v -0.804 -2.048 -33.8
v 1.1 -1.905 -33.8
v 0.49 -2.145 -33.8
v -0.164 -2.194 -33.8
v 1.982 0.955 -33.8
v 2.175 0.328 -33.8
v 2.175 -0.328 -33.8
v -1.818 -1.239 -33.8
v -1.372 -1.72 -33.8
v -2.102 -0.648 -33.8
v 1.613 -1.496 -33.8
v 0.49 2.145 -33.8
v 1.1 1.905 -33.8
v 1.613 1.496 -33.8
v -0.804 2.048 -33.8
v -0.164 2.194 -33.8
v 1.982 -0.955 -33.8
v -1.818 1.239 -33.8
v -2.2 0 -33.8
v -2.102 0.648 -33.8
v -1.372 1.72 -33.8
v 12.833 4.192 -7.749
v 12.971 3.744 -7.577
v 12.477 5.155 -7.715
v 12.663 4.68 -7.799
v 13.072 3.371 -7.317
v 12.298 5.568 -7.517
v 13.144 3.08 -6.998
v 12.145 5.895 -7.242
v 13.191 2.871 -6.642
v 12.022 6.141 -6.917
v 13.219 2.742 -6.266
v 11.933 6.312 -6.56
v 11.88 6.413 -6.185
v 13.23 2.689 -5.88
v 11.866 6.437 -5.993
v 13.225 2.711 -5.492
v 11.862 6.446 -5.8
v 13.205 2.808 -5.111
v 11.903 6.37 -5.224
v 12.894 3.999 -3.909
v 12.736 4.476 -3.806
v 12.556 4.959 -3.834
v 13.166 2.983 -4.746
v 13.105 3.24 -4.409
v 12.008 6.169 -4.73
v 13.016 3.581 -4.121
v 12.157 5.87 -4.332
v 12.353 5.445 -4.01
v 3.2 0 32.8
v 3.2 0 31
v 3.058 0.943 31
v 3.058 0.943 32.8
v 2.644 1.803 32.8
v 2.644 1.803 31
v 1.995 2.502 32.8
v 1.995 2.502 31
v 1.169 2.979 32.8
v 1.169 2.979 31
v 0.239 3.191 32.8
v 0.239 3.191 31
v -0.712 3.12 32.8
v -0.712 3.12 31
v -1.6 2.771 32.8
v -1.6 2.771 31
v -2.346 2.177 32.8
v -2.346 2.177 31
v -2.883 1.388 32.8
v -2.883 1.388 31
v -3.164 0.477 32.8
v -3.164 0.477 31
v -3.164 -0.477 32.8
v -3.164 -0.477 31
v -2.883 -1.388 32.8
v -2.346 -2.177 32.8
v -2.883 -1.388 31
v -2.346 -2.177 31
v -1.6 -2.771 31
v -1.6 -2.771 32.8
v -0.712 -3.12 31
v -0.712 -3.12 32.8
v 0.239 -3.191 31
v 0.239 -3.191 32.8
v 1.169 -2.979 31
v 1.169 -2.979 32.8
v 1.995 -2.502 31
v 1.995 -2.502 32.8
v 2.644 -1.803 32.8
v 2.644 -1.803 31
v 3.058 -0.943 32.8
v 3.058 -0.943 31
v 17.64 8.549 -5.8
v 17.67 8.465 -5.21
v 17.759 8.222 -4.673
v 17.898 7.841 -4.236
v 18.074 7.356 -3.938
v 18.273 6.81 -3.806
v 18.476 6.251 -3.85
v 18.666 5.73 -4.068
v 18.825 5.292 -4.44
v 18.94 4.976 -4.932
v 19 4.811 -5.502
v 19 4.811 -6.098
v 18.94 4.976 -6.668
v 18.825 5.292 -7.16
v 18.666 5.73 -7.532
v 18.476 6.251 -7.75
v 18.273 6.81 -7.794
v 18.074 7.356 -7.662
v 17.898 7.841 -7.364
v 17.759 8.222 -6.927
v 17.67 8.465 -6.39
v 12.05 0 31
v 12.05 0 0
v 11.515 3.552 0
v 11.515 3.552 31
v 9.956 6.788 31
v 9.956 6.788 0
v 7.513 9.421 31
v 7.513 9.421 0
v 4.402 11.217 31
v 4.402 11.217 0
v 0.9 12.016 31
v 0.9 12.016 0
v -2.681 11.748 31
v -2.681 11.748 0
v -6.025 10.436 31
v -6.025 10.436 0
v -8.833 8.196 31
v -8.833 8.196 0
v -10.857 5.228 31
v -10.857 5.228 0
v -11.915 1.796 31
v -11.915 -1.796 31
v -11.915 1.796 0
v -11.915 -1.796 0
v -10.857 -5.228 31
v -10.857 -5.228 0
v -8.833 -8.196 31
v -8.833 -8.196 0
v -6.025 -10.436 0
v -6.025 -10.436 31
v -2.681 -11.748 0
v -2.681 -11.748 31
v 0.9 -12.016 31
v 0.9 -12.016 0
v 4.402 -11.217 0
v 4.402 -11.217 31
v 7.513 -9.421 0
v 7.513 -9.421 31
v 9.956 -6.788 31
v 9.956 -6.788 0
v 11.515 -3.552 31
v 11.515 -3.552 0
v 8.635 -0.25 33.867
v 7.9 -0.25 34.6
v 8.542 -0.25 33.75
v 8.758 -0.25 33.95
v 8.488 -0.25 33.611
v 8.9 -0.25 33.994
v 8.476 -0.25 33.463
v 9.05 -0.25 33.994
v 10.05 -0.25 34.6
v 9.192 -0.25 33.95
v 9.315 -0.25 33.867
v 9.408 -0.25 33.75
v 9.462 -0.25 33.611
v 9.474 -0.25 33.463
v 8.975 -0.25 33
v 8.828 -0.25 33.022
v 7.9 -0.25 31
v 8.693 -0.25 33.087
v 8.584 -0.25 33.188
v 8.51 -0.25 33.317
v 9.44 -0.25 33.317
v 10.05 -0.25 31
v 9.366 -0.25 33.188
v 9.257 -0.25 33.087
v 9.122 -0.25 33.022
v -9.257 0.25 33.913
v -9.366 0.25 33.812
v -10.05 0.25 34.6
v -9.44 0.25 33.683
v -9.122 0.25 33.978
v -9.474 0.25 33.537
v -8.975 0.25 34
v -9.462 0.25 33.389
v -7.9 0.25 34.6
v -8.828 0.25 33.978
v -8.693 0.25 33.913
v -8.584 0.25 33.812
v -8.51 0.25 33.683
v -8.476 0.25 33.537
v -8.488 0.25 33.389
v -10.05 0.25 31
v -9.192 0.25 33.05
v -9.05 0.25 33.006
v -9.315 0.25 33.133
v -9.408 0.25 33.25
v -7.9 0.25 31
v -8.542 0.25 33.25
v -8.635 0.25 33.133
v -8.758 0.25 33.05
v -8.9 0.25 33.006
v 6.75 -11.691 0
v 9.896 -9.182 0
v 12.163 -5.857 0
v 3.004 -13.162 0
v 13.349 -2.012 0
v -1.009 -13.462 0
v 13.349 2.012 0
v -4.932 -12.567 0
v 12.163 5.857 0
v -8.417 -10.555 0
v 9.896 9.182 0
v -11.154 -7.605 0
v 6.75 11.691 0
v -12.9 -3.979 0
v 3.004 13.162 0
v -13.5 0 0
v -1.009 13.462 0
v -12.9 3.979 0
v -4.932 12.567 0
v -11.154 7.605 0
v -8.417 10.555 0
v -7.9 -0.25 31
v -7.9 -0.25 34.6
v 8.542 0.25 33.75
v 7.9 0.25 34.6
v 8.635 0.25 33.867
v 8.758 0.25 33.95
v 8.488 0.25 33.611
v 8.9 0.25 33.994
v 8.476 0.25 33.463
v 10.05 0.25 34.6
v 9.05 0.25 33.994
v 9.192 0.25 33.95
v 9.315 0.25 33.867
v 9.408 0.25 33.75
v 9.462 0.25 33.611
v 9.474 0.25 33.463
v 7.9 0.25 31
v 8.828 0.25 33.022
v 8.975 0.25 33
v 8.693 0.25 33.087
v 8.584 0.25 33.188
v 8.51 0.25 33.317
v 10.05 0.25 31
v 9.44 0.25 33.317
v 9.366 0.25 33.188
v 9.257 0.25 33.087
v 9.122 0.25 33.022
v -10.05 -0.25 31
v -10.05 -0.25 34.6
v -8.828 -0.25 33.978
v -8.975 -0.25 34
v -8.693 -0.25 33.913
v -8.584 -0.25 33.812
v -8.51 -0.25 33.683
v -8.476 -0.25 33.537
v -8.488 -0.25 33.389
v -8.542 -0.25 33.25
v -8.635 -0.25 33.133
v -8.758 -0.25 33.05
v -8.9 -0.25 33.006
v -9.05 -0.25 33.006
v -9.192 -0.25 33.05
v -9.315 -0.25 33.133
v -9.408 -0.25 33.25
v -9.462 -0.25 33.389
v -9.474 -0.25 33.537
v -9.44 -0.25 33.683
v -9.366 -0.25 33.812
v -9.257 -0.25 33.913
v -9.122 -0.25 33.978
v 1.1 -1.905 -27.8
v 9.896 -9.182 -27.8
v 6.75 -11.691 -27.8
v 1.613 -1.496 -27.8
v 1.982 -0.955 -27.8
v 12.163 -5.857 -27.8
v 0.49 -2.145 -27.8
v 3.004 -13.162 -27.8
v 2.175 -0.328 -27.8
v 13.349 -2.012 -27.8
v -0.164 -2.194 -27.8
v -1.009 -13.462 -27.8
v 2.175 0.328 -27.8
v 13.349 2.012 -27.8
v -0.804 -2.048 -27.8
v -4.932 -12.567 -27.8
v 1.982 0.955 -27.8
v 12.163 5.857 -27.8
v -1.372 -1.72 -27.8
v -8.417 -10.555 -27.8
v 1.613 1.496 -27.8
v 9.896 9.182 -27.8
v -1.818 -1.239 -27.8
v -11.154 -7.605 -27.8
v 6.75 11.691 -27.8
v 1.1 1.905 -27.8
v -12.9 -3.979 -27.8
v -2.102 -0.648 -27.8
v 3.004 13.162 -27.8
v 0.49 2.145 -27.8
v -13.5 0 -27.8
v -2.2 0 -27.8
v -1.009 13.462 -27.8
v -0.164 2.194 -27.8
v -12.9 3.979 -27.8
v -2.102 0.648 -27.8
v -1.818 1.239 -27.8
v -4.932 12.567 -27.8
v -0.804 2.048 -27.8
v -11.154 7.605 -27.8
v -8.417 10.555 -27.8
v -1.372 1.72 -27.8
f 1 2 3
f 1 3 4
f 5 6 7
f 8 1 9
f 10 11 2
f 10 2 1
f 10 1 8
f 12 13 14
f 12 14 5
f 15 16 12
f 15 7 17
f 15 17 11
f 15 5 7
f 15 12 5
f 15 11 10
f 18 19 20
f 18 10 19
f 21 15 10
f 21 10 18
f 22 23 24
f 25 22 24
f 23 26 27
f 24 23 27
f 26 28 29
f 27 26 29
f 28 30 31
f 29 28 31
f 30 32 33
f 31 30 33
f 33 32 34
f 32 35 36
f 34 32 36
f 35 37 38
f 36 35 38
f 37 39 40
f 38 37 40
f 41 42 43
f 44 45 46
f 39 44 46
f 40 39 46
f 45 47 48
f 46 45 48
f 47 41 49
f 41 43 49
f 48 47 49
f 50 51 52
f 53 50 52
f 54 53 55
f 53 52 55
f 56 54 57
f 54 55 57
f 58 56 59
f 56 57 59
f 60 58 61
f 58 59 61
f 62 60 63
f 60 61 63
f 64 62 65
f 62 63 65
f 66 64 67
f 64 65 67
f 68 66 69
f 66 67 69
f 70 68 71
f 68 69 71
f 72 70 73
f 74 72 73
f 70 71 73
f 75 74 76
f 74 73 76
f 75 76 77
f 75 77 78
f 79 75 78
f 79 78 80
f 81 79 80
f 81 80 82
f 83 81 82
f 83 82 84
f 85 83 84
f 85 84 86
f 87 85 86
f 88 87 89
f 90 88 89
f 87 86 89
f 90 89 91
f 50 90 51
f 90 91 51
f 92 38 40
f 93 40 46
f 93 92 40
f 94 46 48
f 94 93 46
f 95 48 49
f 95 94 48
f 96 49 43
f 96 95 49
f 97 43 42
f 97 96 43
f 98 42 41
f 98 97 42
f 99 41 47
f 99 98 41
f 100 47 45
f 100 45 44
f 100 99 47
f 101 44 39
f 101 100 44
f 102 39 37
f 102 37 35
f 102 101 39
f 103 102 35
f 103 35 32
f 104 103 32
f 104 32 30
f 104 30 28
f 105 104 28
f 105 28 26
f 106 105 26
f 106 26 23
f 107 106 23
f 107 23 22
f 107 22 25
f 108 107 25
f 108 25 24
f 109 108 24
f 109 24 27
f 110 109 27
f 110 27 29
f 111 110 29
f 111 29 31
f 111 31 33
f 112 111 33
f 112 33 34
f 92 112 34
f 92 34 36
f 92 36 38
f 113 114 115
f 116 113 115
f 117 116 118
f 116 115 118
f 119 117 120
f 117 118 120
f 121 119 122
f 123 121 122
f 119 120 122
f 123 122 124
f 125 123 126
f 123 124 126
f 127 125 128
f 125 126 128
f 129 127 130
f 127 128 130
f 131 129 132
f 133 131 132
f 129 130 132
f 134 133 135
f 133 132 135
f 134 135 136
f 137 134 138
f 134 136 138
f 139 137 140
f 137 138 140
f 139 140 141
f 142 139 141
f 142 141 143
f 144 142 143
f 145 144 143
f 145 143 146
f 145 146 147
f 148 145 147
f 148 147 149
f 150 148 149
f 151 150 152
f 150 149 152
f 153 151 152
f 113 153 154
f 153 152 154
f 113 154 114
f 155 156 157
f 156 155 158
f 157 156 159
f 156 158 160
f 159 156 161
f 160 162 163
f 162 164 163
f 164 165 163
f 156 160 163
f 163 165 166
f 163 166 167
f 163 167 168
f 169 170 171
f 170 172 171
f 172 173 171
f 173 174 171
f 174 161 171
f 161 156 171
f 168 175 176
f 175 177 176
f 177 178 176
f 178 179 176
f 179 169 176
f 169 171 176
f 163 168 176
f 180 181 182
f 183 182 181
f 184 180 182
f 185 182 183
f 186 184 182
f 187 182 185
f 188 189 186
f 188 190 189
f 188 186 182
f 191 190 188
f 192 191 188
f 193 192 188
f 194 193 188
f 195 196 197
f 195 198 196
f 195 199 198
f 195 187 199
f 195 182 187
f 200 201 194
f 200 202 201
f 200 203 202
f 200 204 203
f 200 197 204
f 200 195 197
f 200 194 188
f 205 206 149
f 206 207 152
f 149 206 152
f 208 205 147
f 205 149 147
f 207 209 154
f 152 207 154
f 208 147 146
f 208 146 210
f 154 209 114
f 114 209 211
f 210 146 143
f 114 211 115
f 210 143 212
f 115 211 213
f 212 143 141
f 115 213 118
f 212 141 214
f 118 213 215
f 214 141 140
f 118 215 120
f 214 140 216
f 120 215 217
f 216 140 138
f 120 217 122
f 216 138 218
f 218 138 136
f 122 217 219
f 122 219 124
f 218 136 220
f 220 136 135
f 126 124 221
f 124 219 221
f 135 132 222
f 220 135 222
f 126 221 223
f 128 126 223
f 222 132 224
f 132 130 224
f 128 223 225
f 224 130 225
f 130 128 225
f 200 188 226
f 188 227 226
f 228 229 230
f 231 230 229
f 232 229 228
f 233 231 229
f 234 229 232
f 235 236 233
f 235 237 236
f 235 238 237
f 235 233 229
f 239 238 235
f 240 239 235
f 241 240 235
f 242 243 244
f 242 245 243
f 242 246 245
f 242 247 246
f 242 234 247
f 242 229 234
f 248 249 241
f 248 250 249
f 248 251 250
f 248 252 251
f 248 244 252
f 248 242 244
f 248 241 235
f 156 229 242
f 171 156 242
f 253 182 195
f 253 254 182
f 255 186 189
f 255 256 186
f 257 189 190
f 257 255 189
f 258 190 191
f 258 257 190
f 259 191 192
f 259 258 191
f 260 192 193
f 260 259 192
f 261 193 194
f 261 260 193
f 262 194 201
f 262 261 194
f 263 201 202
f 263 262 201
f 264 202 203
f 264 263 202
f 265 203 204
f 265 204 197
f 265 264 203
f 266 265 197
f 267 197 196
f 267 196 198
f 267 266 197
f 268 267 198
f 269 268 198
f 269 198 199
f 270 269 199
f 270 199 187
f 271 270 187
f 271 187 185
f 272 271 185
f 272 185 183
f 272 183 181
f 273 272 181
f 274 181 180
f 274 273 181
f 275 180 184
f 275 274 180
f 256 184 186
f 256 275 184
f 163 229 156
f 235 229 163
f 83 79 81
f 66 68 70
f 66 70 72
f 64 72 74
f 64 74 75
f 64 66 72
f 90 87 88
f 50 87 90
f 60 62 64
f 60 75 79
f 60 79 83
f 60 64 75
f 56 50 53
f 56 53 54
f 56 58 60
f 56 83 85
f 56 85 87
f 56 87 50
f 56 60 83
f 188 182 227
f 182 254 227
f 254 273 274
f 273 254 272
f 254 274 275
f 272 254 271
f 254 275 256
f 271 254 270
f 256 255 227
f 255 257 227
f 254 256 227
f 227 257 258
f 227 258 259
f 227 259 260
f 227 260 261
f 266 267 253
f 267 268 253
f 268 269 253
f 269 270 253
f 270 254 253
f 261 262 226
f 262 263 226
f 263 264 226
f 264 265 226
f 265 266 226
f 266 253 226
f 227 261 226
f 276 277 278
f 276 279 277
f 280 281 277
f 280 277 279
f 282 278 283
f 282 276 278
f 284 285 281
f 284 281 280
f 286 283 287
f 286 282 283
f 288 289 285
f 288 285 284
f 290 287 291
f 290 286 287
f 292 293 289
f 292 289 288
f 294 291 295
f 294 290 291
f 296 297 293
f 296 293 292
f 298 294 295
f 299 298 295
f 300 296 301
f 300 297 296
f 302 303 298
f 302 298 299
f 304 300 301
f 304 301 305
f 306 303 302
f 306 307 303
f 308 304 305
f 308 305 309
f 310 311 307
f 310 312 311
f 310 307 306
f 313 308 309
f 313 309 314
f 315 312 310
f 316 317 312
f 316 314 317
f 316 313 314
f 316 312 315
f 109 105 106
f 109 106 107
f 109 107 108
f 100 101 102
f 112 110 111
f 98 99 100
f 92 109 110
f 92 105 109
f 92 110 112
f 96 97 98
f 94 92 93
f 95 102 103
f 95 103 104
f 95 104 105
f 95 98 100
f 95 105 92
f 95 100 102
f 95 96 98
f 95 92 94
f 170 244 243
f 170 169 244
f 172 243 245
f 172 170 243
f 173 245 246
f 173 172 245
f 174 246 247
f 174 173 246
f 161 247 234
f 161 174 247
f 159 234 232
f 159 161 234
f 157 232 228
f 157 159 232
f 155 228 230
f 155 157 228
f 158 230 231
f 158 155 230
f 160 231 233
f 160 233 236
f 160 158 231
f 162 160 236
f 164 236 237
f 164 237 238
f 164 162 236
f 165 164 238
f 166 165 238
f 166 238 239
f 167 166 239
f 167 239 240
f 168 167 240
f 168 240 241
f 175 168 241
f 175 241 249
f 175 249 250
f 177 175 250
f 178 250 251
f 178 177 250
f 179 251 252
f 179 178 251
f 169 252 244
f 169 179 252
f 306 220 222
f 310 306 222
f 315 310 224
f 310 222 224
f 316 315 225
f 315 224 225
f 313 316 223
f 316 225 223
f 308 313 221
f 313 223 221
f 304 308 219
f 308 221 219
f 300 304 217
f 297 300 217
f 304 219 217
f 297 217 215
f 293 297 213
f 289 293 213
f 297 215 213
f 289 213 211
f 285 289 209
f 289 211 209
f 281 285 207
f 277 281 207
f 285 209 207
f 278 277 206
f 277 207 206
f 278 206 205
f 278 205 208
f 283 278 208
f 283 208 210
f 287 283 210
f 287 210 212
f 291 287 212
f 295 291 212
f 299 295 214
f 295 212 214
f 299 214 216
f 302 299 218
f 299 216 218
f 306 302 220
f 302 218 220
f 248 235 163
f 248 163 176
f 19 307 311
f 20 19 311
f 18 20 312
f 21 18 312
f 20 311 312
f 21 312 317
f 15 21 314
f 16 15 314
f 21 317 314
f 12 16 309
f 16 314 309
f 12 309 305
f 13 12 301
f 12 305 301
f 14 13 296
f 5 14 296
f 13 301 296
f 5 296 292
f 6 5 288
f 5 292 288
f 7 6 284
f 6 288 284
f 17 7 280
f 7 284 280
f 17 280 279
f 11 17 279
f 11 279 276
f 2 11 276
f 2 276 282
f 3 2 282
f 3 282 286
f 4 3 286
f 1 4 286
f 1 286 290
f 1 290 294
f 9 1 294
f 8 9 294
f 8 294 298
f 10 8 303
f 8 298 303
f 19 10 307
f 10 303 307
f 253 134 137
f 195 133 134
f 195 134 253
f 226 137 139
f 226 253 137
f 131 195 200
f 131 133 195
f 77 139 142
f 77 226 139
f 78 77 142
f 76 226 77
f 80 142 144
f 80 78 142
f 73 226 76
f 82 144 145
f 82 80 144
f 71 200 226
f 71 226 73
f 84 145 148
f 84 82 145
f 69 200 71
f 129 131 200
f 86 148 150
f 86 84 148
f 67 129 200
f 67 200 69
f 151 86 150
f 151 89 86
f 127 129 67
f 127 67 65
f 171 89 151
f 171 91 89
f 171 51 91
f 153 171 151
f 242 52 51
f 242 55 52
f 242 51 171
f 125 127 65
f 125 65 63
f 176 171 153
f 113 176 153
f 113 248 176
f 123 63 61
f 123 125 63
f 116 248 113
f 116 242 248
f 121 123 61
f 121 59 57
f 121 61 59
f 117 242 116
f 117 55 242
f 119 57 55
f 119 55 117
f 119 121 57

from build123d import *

# Parameters (mm, degrees)
ESQUISSE1_R             = 12.05
BOSS_EXTRU_1_DEPTH      = 31
ESQUISSE3_R             = 13.5
BOSS_EXTRU_2_DEPTH      = 27.8
ESQUISSE8_R             = 3.2
BOSS_EXTRU_6_DEPTH      = 1.8
ESQUISSE4_R             = 2.2
BOSS_EXTRU_3_DEPTH      = 6
BOSS_EXTRU_4_REACH      = 54.437
BOSS_EXTRU_4_END_RADIUS = 13.5
BOSS_EXTRU_4_START      = 6
ESQUISSE5_R             = 2
ESQUISSE7_W             = 2.15
ESQUISSE7_H             = 3.6
ESQUISSE7_R             = 0.5
BOSS_EXTRU_5_DEPTH      = 0.25


with BuildPart() as part:
    # Esquisse1 → Boss.-Extru.1 (new body)
    with BuildSketch(Plane.XY):
        Circle(ESQUISSE1_R)
    extrude(amount=BOSS_EXTRU_1_DEPTH)

    # Esquisse3 → Boss.-Extru.2 (add)
    with BuildSketch(Plane(origin=(0, 0, 0), x_dir=(-1, 0, 0), z_dir=(0, 0, -1))):
        Circle(ESQUISSE3_R)
    extrude(amount=BOSS_EXTRU_2_DEPTH)

    # Esquisse8 → Boss.-Extru.6 (add)
    with BuildSketch(Plane.XY.offset(31)):
        Circle(ESQUISSE8_R)
    extrude(amount=BOSS_EXTRU_6_DEPTH)

    # Esquisse4 → Boss.-Extru.3 (add)
    with BuildSketch(Plane(origin=(0, 0, -27.8), x_dir=(-1, 0, 0), z_dir=(0, 0, -1))):
        Circle(ESQUISSE4_R)
    extrude(amount=BOSS_EXTRU_3_DEPTH)

    # Esquisse7 → Boss.-Extru.5 (add, symmetric)
    # profile 1 of 2: a face of its own
    with BuildSketch(Plane(origin=(0, 0, 0), x_dir=(1, 0, 0), z_dir=(0, 1, 0))):
        with Locations((-8.975, -32.8)):
            Rectangle(ESQUISSE7_W, ESQUISSE7_H)
        with Locations(Location((-8.975, -33.5, 0), (0, 0, 270))):
            Circle(ESQUISSE7_R, mode=Mode.SUBTRACT)
    # profile 2 of 2: a face of its own
    with BuildSketch(Plane(origin=(0, 0, 0), x_dir=(1, 0, 0), z_dir=(0, 1, 0))):
        with Locations((8.975, -32.8)):
            Rectangle(ESQUISSE7_W, ESQUISSE7_H)
        with Locations(Location((8.975, -33.5, 0), (0, 0, 90))):
            Circle(ESQUISSE7_R, mode=Mode.SUBTRACT)
    extrude(amount=BOSS_EXTRU_5_DEPTH, both=True)


with BuildPart() as body_2:
    # Boss.-Extru.4: up to this cylinder (the profile starts outside it)
    boss_extru_4_end = Plane(origin=(0, 0, -5.8), z_dir=(0, 0, 1)) * Cylinder(BOSS_EXTRU_4_END_RADIUS, 136.874, mode=Mode.PRIVATE)
    # Esquisse5 → Boss.-Extru.4 (new, up to the surface)
    with BuildSketch(Plane(origin=(12.685850381, 4.617271935, 0), x_dir=(0, 0, 1), z_dir=(0.9396926207859081, 0.34202014332566943, 0)).offset(BOSS_EXTRU_4_START), mode=Mode.PRIVATE) as boss_extru_4_sk1:
        with Locations(Location((-5.8, 0, 0), (0, 0, 270))):
            Circle(ESQUISSE5_R)
    boss_extru_4_tool1 = extrude(boss_extru_4_sk1.sketch, amount=-BOSS_EXTRU_4_REACH, mode=Mode.PRIVATE) - boss_extru_4_end
    add(boss_extru_4_tool1.solids().sort_by_distance((18.324006, 6.669393, -5.8))[0])


solid = Compound([part.part, body_2.part])
